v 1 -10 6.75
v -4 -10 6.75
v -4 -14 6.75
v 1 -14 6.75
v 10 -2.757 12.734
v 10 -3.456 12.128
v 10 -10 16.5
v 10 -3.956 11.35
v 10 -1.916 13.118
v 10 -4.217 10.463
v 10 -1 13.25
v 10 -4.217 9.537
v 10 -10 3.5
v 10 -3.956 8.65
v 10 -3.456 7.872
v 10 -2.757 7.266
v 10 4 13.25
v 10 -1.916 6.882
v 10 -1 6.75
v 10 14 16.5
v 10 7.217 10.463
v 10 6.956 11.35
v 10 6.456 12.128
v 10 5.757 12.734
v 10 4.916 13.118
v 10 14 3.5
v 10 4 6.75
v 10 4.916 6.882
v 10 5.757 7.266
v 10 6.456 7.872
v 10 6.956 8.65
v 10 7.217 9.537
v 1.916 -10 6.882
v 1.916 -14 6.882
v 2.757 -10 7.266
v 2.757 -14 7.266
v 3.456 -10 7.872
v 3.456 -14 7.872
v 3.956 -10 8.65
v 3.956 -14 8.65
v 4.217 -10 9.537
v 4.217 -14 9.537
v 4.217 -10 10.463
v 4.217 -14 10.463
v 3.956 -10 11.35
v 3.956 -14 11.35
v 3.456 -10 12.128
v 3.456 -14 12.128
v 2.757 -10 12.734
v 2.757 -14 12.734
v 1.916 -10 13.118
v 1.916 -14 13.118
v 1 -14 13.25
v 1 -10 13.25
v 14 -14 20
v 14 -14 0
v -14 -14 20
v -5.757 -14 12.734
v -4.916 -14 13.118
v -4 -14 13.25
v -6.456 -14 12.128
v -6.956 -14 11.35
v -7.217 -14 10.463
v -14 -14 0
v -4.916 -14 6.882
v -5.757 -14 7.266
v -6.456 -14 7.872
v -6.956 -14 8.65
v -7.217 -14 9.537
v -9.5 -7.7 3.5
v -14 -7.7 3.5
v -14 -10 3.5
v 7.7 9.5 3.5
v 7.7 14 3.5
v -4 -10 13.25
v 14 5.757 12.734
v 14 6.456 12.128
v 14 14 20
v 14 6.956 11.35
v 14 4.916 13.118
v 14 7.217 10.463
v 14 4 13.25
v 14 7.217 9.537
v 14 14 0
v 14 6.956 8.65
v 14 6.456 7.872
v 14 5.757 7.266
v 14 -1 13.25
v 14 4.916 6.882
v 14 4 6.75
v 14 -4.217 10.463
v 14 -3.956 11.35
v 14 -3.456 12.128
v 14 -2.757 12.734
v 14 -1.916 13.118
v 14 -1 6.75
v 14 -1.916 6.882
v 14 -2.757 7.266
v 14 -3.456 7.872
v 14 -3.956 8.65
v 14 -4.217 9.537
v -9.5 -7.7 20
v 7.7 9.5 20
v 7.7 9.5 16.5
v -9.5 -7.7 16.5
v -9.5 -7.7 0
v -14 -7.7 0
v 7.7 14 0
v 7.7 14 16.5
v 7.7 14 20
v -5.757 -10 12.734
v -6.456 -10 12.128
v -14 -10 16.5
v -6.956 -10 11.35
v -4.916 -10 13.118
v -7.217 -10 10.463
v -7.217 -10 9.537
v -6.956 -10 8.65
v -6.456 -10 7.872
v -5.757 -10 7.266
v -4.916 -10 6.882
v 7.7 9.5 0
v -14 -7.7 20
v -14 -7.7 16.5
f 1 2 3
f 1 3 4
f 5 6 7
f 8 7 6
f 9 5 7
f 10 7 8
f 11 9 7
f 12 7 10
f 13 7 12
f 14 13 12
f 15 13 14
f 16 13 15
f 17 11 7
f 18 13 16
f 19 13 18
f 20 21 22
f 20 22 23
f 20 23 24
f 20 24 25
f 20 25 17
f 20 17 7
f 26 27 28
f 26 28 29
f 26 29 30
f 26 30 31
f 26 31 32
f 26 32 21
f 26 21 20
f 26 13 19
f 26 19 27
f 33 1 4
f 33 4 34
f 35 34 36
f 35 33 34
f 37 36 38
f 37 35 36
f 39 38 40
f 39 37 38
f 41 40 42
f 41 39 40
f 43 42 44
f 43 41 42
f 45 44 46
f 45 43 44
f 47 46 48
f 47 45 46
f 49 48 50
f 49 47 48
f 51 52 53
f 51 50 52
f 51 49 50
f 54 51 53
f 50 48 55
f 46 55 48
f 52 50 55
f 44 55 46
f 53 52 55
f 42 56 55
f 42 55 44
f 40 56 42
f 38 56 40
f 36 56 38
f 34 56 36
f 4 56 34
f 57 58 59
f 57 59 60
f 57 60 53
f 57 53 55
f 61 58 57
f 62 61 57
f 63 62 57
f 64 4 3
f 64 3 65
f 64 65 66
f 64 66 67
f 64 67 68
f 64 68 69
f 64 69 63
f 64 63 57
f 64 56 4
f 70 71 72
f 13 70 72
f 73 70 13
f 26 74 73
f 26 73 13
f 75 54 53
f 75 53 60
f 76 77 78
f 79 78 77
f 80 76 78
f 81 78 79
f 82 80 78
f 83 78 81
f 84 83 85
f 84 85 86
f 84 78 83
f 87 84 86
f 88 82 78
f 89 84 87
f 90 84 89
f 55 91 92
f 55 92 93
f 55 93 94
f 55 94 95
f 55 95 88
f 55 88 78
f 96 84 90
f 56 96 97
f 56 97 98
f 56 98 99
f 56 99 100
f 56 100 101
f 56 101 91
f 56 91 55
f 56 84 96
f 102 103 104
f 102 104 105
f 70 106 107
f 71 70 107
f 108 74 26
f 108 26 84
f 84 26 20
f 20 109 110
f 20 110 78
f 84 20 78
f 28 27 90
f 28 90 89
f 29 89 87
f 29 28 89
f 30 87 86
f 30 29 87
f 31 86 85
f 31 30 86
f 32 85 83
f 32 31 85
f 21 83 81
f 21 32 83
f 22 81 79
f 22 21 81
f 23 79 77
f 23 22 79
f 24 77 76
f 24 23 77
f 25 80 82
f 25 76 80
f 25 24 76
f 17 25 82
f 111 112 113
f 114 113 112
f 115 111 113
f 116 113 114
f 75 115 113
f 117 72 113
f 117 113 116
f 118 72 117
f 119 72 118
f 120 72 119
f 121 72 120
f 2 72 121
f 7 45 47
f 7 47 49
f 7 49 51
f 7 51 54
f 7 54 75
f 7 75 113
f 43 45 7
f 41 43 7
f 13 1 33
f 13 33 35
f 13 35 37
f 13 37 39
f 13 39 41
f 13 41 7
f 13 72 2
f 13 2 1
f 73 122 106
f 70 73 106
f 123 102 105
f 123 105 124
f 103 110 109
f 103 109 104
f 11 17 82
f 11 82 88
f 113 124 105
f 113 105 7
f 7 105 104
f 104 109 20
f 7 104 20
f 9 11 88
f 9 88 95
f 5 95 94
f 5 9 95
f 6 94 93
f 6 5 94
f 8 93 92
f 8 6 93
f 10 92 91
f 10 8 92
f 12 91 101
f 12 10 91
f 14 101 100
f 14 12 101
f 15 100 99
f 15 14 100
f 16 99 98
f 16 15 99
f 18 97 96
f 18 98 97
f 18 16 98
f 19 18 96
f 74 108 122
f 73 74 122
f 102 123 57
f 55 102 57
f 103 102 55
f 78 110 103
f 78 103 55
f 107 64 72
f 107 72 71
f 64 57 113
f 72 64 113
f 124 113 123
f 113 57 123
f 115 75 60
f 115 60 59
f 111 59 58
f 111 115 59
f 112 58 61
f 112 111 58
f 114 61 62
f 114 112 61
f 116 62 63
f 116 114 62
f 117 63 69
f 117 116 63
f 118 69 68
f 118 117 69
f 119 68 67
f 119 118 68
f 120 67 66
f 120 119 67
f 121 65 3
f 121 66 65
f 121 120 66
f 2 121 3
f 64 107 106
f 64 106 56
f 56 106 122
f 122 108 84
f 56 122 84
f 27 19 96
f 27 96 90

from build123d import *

# Parameters (mm, degrees)
EXTRUDE_1_DEPTH     = 20
EXTRUDE_2_DEPTH     = 3.5
CUT_EXTRUDE_2_DEPTH = 35.234485537
CUT_EXTRUDE_3_DEPTH = 35.234485537


with BuildPart() as part:
    # 草图1 → 凸台-拉伸1 (new body)
    with BuildSketch(Plane.XY):
        Polygon((14, -14), (-14, -14), (-14, -10), (10, -10), (10, 14), (14, 14), align=None)
    extrude(amount=EXTRUDE_1_DEPTH)

    # 草图3 → 凸台-拉伸2 (add)
    with BuildSketch(Plane(origin=(0, 0, 0), x_dir=(-1, 0, 0), z_dir=(0, 0, -1))):
        Polygon((-10, 14), (-7.7, 14), (-7.7, 9.5), (9.5, -7.7), (14, -7.7), (14, -10), (14, -14), (-14, -14), (-14, 14), align=None)
    extrude_2 = extrude(amount=-EXTRUDE_2_DEPTH)

    # 镜向2: 凸台-拉伸2 across plane
    add(extrude_2.mirror(Plane.XY.offset(10)))

    # 草图6 → 切除-拉伸2 (cut, through all)
    with BuildSketch(Plane.ZY.offset(-10)):
        with BuildLine():
            Line((13.25, 4), (13.25, -1))
            ThreePointArc((13.25, -1), (10, -4.25), (6.75, -1))
            Line((6.75, -1), (6.75, 4))
            ThreePointArc((6.75, 4), (10, 7.25), (13.25, 4))
        make_face()
    extrude(amount=-CUT_EXTRUDE_2_DEPTH, mode=Mode.SUBTRACT)

    # 草图8 → 切除-拉伸3 (cut, through all)
    with BuildSketch(Plane(origin=(0, -10, 0), x_dir=(1, 0, 0), z_dir=(0, 1, 0))):
        with BuildLine():
            Line((-4, -6.75), (1, -6.75))
            ThreePointArc((1, -6.75), (4.25, -10), (1, -13.25))
            Line((1, -13.25), (-4, -13.25))
            ThreePointArc((-4, -13.25), (-7.25, -10), (-4, -6.75))
        make_face()
    extrude(amount=-CUT_EXTRUDE_3_DEPTH, mode=Mode.SUBTRACT)


solid = part.part
